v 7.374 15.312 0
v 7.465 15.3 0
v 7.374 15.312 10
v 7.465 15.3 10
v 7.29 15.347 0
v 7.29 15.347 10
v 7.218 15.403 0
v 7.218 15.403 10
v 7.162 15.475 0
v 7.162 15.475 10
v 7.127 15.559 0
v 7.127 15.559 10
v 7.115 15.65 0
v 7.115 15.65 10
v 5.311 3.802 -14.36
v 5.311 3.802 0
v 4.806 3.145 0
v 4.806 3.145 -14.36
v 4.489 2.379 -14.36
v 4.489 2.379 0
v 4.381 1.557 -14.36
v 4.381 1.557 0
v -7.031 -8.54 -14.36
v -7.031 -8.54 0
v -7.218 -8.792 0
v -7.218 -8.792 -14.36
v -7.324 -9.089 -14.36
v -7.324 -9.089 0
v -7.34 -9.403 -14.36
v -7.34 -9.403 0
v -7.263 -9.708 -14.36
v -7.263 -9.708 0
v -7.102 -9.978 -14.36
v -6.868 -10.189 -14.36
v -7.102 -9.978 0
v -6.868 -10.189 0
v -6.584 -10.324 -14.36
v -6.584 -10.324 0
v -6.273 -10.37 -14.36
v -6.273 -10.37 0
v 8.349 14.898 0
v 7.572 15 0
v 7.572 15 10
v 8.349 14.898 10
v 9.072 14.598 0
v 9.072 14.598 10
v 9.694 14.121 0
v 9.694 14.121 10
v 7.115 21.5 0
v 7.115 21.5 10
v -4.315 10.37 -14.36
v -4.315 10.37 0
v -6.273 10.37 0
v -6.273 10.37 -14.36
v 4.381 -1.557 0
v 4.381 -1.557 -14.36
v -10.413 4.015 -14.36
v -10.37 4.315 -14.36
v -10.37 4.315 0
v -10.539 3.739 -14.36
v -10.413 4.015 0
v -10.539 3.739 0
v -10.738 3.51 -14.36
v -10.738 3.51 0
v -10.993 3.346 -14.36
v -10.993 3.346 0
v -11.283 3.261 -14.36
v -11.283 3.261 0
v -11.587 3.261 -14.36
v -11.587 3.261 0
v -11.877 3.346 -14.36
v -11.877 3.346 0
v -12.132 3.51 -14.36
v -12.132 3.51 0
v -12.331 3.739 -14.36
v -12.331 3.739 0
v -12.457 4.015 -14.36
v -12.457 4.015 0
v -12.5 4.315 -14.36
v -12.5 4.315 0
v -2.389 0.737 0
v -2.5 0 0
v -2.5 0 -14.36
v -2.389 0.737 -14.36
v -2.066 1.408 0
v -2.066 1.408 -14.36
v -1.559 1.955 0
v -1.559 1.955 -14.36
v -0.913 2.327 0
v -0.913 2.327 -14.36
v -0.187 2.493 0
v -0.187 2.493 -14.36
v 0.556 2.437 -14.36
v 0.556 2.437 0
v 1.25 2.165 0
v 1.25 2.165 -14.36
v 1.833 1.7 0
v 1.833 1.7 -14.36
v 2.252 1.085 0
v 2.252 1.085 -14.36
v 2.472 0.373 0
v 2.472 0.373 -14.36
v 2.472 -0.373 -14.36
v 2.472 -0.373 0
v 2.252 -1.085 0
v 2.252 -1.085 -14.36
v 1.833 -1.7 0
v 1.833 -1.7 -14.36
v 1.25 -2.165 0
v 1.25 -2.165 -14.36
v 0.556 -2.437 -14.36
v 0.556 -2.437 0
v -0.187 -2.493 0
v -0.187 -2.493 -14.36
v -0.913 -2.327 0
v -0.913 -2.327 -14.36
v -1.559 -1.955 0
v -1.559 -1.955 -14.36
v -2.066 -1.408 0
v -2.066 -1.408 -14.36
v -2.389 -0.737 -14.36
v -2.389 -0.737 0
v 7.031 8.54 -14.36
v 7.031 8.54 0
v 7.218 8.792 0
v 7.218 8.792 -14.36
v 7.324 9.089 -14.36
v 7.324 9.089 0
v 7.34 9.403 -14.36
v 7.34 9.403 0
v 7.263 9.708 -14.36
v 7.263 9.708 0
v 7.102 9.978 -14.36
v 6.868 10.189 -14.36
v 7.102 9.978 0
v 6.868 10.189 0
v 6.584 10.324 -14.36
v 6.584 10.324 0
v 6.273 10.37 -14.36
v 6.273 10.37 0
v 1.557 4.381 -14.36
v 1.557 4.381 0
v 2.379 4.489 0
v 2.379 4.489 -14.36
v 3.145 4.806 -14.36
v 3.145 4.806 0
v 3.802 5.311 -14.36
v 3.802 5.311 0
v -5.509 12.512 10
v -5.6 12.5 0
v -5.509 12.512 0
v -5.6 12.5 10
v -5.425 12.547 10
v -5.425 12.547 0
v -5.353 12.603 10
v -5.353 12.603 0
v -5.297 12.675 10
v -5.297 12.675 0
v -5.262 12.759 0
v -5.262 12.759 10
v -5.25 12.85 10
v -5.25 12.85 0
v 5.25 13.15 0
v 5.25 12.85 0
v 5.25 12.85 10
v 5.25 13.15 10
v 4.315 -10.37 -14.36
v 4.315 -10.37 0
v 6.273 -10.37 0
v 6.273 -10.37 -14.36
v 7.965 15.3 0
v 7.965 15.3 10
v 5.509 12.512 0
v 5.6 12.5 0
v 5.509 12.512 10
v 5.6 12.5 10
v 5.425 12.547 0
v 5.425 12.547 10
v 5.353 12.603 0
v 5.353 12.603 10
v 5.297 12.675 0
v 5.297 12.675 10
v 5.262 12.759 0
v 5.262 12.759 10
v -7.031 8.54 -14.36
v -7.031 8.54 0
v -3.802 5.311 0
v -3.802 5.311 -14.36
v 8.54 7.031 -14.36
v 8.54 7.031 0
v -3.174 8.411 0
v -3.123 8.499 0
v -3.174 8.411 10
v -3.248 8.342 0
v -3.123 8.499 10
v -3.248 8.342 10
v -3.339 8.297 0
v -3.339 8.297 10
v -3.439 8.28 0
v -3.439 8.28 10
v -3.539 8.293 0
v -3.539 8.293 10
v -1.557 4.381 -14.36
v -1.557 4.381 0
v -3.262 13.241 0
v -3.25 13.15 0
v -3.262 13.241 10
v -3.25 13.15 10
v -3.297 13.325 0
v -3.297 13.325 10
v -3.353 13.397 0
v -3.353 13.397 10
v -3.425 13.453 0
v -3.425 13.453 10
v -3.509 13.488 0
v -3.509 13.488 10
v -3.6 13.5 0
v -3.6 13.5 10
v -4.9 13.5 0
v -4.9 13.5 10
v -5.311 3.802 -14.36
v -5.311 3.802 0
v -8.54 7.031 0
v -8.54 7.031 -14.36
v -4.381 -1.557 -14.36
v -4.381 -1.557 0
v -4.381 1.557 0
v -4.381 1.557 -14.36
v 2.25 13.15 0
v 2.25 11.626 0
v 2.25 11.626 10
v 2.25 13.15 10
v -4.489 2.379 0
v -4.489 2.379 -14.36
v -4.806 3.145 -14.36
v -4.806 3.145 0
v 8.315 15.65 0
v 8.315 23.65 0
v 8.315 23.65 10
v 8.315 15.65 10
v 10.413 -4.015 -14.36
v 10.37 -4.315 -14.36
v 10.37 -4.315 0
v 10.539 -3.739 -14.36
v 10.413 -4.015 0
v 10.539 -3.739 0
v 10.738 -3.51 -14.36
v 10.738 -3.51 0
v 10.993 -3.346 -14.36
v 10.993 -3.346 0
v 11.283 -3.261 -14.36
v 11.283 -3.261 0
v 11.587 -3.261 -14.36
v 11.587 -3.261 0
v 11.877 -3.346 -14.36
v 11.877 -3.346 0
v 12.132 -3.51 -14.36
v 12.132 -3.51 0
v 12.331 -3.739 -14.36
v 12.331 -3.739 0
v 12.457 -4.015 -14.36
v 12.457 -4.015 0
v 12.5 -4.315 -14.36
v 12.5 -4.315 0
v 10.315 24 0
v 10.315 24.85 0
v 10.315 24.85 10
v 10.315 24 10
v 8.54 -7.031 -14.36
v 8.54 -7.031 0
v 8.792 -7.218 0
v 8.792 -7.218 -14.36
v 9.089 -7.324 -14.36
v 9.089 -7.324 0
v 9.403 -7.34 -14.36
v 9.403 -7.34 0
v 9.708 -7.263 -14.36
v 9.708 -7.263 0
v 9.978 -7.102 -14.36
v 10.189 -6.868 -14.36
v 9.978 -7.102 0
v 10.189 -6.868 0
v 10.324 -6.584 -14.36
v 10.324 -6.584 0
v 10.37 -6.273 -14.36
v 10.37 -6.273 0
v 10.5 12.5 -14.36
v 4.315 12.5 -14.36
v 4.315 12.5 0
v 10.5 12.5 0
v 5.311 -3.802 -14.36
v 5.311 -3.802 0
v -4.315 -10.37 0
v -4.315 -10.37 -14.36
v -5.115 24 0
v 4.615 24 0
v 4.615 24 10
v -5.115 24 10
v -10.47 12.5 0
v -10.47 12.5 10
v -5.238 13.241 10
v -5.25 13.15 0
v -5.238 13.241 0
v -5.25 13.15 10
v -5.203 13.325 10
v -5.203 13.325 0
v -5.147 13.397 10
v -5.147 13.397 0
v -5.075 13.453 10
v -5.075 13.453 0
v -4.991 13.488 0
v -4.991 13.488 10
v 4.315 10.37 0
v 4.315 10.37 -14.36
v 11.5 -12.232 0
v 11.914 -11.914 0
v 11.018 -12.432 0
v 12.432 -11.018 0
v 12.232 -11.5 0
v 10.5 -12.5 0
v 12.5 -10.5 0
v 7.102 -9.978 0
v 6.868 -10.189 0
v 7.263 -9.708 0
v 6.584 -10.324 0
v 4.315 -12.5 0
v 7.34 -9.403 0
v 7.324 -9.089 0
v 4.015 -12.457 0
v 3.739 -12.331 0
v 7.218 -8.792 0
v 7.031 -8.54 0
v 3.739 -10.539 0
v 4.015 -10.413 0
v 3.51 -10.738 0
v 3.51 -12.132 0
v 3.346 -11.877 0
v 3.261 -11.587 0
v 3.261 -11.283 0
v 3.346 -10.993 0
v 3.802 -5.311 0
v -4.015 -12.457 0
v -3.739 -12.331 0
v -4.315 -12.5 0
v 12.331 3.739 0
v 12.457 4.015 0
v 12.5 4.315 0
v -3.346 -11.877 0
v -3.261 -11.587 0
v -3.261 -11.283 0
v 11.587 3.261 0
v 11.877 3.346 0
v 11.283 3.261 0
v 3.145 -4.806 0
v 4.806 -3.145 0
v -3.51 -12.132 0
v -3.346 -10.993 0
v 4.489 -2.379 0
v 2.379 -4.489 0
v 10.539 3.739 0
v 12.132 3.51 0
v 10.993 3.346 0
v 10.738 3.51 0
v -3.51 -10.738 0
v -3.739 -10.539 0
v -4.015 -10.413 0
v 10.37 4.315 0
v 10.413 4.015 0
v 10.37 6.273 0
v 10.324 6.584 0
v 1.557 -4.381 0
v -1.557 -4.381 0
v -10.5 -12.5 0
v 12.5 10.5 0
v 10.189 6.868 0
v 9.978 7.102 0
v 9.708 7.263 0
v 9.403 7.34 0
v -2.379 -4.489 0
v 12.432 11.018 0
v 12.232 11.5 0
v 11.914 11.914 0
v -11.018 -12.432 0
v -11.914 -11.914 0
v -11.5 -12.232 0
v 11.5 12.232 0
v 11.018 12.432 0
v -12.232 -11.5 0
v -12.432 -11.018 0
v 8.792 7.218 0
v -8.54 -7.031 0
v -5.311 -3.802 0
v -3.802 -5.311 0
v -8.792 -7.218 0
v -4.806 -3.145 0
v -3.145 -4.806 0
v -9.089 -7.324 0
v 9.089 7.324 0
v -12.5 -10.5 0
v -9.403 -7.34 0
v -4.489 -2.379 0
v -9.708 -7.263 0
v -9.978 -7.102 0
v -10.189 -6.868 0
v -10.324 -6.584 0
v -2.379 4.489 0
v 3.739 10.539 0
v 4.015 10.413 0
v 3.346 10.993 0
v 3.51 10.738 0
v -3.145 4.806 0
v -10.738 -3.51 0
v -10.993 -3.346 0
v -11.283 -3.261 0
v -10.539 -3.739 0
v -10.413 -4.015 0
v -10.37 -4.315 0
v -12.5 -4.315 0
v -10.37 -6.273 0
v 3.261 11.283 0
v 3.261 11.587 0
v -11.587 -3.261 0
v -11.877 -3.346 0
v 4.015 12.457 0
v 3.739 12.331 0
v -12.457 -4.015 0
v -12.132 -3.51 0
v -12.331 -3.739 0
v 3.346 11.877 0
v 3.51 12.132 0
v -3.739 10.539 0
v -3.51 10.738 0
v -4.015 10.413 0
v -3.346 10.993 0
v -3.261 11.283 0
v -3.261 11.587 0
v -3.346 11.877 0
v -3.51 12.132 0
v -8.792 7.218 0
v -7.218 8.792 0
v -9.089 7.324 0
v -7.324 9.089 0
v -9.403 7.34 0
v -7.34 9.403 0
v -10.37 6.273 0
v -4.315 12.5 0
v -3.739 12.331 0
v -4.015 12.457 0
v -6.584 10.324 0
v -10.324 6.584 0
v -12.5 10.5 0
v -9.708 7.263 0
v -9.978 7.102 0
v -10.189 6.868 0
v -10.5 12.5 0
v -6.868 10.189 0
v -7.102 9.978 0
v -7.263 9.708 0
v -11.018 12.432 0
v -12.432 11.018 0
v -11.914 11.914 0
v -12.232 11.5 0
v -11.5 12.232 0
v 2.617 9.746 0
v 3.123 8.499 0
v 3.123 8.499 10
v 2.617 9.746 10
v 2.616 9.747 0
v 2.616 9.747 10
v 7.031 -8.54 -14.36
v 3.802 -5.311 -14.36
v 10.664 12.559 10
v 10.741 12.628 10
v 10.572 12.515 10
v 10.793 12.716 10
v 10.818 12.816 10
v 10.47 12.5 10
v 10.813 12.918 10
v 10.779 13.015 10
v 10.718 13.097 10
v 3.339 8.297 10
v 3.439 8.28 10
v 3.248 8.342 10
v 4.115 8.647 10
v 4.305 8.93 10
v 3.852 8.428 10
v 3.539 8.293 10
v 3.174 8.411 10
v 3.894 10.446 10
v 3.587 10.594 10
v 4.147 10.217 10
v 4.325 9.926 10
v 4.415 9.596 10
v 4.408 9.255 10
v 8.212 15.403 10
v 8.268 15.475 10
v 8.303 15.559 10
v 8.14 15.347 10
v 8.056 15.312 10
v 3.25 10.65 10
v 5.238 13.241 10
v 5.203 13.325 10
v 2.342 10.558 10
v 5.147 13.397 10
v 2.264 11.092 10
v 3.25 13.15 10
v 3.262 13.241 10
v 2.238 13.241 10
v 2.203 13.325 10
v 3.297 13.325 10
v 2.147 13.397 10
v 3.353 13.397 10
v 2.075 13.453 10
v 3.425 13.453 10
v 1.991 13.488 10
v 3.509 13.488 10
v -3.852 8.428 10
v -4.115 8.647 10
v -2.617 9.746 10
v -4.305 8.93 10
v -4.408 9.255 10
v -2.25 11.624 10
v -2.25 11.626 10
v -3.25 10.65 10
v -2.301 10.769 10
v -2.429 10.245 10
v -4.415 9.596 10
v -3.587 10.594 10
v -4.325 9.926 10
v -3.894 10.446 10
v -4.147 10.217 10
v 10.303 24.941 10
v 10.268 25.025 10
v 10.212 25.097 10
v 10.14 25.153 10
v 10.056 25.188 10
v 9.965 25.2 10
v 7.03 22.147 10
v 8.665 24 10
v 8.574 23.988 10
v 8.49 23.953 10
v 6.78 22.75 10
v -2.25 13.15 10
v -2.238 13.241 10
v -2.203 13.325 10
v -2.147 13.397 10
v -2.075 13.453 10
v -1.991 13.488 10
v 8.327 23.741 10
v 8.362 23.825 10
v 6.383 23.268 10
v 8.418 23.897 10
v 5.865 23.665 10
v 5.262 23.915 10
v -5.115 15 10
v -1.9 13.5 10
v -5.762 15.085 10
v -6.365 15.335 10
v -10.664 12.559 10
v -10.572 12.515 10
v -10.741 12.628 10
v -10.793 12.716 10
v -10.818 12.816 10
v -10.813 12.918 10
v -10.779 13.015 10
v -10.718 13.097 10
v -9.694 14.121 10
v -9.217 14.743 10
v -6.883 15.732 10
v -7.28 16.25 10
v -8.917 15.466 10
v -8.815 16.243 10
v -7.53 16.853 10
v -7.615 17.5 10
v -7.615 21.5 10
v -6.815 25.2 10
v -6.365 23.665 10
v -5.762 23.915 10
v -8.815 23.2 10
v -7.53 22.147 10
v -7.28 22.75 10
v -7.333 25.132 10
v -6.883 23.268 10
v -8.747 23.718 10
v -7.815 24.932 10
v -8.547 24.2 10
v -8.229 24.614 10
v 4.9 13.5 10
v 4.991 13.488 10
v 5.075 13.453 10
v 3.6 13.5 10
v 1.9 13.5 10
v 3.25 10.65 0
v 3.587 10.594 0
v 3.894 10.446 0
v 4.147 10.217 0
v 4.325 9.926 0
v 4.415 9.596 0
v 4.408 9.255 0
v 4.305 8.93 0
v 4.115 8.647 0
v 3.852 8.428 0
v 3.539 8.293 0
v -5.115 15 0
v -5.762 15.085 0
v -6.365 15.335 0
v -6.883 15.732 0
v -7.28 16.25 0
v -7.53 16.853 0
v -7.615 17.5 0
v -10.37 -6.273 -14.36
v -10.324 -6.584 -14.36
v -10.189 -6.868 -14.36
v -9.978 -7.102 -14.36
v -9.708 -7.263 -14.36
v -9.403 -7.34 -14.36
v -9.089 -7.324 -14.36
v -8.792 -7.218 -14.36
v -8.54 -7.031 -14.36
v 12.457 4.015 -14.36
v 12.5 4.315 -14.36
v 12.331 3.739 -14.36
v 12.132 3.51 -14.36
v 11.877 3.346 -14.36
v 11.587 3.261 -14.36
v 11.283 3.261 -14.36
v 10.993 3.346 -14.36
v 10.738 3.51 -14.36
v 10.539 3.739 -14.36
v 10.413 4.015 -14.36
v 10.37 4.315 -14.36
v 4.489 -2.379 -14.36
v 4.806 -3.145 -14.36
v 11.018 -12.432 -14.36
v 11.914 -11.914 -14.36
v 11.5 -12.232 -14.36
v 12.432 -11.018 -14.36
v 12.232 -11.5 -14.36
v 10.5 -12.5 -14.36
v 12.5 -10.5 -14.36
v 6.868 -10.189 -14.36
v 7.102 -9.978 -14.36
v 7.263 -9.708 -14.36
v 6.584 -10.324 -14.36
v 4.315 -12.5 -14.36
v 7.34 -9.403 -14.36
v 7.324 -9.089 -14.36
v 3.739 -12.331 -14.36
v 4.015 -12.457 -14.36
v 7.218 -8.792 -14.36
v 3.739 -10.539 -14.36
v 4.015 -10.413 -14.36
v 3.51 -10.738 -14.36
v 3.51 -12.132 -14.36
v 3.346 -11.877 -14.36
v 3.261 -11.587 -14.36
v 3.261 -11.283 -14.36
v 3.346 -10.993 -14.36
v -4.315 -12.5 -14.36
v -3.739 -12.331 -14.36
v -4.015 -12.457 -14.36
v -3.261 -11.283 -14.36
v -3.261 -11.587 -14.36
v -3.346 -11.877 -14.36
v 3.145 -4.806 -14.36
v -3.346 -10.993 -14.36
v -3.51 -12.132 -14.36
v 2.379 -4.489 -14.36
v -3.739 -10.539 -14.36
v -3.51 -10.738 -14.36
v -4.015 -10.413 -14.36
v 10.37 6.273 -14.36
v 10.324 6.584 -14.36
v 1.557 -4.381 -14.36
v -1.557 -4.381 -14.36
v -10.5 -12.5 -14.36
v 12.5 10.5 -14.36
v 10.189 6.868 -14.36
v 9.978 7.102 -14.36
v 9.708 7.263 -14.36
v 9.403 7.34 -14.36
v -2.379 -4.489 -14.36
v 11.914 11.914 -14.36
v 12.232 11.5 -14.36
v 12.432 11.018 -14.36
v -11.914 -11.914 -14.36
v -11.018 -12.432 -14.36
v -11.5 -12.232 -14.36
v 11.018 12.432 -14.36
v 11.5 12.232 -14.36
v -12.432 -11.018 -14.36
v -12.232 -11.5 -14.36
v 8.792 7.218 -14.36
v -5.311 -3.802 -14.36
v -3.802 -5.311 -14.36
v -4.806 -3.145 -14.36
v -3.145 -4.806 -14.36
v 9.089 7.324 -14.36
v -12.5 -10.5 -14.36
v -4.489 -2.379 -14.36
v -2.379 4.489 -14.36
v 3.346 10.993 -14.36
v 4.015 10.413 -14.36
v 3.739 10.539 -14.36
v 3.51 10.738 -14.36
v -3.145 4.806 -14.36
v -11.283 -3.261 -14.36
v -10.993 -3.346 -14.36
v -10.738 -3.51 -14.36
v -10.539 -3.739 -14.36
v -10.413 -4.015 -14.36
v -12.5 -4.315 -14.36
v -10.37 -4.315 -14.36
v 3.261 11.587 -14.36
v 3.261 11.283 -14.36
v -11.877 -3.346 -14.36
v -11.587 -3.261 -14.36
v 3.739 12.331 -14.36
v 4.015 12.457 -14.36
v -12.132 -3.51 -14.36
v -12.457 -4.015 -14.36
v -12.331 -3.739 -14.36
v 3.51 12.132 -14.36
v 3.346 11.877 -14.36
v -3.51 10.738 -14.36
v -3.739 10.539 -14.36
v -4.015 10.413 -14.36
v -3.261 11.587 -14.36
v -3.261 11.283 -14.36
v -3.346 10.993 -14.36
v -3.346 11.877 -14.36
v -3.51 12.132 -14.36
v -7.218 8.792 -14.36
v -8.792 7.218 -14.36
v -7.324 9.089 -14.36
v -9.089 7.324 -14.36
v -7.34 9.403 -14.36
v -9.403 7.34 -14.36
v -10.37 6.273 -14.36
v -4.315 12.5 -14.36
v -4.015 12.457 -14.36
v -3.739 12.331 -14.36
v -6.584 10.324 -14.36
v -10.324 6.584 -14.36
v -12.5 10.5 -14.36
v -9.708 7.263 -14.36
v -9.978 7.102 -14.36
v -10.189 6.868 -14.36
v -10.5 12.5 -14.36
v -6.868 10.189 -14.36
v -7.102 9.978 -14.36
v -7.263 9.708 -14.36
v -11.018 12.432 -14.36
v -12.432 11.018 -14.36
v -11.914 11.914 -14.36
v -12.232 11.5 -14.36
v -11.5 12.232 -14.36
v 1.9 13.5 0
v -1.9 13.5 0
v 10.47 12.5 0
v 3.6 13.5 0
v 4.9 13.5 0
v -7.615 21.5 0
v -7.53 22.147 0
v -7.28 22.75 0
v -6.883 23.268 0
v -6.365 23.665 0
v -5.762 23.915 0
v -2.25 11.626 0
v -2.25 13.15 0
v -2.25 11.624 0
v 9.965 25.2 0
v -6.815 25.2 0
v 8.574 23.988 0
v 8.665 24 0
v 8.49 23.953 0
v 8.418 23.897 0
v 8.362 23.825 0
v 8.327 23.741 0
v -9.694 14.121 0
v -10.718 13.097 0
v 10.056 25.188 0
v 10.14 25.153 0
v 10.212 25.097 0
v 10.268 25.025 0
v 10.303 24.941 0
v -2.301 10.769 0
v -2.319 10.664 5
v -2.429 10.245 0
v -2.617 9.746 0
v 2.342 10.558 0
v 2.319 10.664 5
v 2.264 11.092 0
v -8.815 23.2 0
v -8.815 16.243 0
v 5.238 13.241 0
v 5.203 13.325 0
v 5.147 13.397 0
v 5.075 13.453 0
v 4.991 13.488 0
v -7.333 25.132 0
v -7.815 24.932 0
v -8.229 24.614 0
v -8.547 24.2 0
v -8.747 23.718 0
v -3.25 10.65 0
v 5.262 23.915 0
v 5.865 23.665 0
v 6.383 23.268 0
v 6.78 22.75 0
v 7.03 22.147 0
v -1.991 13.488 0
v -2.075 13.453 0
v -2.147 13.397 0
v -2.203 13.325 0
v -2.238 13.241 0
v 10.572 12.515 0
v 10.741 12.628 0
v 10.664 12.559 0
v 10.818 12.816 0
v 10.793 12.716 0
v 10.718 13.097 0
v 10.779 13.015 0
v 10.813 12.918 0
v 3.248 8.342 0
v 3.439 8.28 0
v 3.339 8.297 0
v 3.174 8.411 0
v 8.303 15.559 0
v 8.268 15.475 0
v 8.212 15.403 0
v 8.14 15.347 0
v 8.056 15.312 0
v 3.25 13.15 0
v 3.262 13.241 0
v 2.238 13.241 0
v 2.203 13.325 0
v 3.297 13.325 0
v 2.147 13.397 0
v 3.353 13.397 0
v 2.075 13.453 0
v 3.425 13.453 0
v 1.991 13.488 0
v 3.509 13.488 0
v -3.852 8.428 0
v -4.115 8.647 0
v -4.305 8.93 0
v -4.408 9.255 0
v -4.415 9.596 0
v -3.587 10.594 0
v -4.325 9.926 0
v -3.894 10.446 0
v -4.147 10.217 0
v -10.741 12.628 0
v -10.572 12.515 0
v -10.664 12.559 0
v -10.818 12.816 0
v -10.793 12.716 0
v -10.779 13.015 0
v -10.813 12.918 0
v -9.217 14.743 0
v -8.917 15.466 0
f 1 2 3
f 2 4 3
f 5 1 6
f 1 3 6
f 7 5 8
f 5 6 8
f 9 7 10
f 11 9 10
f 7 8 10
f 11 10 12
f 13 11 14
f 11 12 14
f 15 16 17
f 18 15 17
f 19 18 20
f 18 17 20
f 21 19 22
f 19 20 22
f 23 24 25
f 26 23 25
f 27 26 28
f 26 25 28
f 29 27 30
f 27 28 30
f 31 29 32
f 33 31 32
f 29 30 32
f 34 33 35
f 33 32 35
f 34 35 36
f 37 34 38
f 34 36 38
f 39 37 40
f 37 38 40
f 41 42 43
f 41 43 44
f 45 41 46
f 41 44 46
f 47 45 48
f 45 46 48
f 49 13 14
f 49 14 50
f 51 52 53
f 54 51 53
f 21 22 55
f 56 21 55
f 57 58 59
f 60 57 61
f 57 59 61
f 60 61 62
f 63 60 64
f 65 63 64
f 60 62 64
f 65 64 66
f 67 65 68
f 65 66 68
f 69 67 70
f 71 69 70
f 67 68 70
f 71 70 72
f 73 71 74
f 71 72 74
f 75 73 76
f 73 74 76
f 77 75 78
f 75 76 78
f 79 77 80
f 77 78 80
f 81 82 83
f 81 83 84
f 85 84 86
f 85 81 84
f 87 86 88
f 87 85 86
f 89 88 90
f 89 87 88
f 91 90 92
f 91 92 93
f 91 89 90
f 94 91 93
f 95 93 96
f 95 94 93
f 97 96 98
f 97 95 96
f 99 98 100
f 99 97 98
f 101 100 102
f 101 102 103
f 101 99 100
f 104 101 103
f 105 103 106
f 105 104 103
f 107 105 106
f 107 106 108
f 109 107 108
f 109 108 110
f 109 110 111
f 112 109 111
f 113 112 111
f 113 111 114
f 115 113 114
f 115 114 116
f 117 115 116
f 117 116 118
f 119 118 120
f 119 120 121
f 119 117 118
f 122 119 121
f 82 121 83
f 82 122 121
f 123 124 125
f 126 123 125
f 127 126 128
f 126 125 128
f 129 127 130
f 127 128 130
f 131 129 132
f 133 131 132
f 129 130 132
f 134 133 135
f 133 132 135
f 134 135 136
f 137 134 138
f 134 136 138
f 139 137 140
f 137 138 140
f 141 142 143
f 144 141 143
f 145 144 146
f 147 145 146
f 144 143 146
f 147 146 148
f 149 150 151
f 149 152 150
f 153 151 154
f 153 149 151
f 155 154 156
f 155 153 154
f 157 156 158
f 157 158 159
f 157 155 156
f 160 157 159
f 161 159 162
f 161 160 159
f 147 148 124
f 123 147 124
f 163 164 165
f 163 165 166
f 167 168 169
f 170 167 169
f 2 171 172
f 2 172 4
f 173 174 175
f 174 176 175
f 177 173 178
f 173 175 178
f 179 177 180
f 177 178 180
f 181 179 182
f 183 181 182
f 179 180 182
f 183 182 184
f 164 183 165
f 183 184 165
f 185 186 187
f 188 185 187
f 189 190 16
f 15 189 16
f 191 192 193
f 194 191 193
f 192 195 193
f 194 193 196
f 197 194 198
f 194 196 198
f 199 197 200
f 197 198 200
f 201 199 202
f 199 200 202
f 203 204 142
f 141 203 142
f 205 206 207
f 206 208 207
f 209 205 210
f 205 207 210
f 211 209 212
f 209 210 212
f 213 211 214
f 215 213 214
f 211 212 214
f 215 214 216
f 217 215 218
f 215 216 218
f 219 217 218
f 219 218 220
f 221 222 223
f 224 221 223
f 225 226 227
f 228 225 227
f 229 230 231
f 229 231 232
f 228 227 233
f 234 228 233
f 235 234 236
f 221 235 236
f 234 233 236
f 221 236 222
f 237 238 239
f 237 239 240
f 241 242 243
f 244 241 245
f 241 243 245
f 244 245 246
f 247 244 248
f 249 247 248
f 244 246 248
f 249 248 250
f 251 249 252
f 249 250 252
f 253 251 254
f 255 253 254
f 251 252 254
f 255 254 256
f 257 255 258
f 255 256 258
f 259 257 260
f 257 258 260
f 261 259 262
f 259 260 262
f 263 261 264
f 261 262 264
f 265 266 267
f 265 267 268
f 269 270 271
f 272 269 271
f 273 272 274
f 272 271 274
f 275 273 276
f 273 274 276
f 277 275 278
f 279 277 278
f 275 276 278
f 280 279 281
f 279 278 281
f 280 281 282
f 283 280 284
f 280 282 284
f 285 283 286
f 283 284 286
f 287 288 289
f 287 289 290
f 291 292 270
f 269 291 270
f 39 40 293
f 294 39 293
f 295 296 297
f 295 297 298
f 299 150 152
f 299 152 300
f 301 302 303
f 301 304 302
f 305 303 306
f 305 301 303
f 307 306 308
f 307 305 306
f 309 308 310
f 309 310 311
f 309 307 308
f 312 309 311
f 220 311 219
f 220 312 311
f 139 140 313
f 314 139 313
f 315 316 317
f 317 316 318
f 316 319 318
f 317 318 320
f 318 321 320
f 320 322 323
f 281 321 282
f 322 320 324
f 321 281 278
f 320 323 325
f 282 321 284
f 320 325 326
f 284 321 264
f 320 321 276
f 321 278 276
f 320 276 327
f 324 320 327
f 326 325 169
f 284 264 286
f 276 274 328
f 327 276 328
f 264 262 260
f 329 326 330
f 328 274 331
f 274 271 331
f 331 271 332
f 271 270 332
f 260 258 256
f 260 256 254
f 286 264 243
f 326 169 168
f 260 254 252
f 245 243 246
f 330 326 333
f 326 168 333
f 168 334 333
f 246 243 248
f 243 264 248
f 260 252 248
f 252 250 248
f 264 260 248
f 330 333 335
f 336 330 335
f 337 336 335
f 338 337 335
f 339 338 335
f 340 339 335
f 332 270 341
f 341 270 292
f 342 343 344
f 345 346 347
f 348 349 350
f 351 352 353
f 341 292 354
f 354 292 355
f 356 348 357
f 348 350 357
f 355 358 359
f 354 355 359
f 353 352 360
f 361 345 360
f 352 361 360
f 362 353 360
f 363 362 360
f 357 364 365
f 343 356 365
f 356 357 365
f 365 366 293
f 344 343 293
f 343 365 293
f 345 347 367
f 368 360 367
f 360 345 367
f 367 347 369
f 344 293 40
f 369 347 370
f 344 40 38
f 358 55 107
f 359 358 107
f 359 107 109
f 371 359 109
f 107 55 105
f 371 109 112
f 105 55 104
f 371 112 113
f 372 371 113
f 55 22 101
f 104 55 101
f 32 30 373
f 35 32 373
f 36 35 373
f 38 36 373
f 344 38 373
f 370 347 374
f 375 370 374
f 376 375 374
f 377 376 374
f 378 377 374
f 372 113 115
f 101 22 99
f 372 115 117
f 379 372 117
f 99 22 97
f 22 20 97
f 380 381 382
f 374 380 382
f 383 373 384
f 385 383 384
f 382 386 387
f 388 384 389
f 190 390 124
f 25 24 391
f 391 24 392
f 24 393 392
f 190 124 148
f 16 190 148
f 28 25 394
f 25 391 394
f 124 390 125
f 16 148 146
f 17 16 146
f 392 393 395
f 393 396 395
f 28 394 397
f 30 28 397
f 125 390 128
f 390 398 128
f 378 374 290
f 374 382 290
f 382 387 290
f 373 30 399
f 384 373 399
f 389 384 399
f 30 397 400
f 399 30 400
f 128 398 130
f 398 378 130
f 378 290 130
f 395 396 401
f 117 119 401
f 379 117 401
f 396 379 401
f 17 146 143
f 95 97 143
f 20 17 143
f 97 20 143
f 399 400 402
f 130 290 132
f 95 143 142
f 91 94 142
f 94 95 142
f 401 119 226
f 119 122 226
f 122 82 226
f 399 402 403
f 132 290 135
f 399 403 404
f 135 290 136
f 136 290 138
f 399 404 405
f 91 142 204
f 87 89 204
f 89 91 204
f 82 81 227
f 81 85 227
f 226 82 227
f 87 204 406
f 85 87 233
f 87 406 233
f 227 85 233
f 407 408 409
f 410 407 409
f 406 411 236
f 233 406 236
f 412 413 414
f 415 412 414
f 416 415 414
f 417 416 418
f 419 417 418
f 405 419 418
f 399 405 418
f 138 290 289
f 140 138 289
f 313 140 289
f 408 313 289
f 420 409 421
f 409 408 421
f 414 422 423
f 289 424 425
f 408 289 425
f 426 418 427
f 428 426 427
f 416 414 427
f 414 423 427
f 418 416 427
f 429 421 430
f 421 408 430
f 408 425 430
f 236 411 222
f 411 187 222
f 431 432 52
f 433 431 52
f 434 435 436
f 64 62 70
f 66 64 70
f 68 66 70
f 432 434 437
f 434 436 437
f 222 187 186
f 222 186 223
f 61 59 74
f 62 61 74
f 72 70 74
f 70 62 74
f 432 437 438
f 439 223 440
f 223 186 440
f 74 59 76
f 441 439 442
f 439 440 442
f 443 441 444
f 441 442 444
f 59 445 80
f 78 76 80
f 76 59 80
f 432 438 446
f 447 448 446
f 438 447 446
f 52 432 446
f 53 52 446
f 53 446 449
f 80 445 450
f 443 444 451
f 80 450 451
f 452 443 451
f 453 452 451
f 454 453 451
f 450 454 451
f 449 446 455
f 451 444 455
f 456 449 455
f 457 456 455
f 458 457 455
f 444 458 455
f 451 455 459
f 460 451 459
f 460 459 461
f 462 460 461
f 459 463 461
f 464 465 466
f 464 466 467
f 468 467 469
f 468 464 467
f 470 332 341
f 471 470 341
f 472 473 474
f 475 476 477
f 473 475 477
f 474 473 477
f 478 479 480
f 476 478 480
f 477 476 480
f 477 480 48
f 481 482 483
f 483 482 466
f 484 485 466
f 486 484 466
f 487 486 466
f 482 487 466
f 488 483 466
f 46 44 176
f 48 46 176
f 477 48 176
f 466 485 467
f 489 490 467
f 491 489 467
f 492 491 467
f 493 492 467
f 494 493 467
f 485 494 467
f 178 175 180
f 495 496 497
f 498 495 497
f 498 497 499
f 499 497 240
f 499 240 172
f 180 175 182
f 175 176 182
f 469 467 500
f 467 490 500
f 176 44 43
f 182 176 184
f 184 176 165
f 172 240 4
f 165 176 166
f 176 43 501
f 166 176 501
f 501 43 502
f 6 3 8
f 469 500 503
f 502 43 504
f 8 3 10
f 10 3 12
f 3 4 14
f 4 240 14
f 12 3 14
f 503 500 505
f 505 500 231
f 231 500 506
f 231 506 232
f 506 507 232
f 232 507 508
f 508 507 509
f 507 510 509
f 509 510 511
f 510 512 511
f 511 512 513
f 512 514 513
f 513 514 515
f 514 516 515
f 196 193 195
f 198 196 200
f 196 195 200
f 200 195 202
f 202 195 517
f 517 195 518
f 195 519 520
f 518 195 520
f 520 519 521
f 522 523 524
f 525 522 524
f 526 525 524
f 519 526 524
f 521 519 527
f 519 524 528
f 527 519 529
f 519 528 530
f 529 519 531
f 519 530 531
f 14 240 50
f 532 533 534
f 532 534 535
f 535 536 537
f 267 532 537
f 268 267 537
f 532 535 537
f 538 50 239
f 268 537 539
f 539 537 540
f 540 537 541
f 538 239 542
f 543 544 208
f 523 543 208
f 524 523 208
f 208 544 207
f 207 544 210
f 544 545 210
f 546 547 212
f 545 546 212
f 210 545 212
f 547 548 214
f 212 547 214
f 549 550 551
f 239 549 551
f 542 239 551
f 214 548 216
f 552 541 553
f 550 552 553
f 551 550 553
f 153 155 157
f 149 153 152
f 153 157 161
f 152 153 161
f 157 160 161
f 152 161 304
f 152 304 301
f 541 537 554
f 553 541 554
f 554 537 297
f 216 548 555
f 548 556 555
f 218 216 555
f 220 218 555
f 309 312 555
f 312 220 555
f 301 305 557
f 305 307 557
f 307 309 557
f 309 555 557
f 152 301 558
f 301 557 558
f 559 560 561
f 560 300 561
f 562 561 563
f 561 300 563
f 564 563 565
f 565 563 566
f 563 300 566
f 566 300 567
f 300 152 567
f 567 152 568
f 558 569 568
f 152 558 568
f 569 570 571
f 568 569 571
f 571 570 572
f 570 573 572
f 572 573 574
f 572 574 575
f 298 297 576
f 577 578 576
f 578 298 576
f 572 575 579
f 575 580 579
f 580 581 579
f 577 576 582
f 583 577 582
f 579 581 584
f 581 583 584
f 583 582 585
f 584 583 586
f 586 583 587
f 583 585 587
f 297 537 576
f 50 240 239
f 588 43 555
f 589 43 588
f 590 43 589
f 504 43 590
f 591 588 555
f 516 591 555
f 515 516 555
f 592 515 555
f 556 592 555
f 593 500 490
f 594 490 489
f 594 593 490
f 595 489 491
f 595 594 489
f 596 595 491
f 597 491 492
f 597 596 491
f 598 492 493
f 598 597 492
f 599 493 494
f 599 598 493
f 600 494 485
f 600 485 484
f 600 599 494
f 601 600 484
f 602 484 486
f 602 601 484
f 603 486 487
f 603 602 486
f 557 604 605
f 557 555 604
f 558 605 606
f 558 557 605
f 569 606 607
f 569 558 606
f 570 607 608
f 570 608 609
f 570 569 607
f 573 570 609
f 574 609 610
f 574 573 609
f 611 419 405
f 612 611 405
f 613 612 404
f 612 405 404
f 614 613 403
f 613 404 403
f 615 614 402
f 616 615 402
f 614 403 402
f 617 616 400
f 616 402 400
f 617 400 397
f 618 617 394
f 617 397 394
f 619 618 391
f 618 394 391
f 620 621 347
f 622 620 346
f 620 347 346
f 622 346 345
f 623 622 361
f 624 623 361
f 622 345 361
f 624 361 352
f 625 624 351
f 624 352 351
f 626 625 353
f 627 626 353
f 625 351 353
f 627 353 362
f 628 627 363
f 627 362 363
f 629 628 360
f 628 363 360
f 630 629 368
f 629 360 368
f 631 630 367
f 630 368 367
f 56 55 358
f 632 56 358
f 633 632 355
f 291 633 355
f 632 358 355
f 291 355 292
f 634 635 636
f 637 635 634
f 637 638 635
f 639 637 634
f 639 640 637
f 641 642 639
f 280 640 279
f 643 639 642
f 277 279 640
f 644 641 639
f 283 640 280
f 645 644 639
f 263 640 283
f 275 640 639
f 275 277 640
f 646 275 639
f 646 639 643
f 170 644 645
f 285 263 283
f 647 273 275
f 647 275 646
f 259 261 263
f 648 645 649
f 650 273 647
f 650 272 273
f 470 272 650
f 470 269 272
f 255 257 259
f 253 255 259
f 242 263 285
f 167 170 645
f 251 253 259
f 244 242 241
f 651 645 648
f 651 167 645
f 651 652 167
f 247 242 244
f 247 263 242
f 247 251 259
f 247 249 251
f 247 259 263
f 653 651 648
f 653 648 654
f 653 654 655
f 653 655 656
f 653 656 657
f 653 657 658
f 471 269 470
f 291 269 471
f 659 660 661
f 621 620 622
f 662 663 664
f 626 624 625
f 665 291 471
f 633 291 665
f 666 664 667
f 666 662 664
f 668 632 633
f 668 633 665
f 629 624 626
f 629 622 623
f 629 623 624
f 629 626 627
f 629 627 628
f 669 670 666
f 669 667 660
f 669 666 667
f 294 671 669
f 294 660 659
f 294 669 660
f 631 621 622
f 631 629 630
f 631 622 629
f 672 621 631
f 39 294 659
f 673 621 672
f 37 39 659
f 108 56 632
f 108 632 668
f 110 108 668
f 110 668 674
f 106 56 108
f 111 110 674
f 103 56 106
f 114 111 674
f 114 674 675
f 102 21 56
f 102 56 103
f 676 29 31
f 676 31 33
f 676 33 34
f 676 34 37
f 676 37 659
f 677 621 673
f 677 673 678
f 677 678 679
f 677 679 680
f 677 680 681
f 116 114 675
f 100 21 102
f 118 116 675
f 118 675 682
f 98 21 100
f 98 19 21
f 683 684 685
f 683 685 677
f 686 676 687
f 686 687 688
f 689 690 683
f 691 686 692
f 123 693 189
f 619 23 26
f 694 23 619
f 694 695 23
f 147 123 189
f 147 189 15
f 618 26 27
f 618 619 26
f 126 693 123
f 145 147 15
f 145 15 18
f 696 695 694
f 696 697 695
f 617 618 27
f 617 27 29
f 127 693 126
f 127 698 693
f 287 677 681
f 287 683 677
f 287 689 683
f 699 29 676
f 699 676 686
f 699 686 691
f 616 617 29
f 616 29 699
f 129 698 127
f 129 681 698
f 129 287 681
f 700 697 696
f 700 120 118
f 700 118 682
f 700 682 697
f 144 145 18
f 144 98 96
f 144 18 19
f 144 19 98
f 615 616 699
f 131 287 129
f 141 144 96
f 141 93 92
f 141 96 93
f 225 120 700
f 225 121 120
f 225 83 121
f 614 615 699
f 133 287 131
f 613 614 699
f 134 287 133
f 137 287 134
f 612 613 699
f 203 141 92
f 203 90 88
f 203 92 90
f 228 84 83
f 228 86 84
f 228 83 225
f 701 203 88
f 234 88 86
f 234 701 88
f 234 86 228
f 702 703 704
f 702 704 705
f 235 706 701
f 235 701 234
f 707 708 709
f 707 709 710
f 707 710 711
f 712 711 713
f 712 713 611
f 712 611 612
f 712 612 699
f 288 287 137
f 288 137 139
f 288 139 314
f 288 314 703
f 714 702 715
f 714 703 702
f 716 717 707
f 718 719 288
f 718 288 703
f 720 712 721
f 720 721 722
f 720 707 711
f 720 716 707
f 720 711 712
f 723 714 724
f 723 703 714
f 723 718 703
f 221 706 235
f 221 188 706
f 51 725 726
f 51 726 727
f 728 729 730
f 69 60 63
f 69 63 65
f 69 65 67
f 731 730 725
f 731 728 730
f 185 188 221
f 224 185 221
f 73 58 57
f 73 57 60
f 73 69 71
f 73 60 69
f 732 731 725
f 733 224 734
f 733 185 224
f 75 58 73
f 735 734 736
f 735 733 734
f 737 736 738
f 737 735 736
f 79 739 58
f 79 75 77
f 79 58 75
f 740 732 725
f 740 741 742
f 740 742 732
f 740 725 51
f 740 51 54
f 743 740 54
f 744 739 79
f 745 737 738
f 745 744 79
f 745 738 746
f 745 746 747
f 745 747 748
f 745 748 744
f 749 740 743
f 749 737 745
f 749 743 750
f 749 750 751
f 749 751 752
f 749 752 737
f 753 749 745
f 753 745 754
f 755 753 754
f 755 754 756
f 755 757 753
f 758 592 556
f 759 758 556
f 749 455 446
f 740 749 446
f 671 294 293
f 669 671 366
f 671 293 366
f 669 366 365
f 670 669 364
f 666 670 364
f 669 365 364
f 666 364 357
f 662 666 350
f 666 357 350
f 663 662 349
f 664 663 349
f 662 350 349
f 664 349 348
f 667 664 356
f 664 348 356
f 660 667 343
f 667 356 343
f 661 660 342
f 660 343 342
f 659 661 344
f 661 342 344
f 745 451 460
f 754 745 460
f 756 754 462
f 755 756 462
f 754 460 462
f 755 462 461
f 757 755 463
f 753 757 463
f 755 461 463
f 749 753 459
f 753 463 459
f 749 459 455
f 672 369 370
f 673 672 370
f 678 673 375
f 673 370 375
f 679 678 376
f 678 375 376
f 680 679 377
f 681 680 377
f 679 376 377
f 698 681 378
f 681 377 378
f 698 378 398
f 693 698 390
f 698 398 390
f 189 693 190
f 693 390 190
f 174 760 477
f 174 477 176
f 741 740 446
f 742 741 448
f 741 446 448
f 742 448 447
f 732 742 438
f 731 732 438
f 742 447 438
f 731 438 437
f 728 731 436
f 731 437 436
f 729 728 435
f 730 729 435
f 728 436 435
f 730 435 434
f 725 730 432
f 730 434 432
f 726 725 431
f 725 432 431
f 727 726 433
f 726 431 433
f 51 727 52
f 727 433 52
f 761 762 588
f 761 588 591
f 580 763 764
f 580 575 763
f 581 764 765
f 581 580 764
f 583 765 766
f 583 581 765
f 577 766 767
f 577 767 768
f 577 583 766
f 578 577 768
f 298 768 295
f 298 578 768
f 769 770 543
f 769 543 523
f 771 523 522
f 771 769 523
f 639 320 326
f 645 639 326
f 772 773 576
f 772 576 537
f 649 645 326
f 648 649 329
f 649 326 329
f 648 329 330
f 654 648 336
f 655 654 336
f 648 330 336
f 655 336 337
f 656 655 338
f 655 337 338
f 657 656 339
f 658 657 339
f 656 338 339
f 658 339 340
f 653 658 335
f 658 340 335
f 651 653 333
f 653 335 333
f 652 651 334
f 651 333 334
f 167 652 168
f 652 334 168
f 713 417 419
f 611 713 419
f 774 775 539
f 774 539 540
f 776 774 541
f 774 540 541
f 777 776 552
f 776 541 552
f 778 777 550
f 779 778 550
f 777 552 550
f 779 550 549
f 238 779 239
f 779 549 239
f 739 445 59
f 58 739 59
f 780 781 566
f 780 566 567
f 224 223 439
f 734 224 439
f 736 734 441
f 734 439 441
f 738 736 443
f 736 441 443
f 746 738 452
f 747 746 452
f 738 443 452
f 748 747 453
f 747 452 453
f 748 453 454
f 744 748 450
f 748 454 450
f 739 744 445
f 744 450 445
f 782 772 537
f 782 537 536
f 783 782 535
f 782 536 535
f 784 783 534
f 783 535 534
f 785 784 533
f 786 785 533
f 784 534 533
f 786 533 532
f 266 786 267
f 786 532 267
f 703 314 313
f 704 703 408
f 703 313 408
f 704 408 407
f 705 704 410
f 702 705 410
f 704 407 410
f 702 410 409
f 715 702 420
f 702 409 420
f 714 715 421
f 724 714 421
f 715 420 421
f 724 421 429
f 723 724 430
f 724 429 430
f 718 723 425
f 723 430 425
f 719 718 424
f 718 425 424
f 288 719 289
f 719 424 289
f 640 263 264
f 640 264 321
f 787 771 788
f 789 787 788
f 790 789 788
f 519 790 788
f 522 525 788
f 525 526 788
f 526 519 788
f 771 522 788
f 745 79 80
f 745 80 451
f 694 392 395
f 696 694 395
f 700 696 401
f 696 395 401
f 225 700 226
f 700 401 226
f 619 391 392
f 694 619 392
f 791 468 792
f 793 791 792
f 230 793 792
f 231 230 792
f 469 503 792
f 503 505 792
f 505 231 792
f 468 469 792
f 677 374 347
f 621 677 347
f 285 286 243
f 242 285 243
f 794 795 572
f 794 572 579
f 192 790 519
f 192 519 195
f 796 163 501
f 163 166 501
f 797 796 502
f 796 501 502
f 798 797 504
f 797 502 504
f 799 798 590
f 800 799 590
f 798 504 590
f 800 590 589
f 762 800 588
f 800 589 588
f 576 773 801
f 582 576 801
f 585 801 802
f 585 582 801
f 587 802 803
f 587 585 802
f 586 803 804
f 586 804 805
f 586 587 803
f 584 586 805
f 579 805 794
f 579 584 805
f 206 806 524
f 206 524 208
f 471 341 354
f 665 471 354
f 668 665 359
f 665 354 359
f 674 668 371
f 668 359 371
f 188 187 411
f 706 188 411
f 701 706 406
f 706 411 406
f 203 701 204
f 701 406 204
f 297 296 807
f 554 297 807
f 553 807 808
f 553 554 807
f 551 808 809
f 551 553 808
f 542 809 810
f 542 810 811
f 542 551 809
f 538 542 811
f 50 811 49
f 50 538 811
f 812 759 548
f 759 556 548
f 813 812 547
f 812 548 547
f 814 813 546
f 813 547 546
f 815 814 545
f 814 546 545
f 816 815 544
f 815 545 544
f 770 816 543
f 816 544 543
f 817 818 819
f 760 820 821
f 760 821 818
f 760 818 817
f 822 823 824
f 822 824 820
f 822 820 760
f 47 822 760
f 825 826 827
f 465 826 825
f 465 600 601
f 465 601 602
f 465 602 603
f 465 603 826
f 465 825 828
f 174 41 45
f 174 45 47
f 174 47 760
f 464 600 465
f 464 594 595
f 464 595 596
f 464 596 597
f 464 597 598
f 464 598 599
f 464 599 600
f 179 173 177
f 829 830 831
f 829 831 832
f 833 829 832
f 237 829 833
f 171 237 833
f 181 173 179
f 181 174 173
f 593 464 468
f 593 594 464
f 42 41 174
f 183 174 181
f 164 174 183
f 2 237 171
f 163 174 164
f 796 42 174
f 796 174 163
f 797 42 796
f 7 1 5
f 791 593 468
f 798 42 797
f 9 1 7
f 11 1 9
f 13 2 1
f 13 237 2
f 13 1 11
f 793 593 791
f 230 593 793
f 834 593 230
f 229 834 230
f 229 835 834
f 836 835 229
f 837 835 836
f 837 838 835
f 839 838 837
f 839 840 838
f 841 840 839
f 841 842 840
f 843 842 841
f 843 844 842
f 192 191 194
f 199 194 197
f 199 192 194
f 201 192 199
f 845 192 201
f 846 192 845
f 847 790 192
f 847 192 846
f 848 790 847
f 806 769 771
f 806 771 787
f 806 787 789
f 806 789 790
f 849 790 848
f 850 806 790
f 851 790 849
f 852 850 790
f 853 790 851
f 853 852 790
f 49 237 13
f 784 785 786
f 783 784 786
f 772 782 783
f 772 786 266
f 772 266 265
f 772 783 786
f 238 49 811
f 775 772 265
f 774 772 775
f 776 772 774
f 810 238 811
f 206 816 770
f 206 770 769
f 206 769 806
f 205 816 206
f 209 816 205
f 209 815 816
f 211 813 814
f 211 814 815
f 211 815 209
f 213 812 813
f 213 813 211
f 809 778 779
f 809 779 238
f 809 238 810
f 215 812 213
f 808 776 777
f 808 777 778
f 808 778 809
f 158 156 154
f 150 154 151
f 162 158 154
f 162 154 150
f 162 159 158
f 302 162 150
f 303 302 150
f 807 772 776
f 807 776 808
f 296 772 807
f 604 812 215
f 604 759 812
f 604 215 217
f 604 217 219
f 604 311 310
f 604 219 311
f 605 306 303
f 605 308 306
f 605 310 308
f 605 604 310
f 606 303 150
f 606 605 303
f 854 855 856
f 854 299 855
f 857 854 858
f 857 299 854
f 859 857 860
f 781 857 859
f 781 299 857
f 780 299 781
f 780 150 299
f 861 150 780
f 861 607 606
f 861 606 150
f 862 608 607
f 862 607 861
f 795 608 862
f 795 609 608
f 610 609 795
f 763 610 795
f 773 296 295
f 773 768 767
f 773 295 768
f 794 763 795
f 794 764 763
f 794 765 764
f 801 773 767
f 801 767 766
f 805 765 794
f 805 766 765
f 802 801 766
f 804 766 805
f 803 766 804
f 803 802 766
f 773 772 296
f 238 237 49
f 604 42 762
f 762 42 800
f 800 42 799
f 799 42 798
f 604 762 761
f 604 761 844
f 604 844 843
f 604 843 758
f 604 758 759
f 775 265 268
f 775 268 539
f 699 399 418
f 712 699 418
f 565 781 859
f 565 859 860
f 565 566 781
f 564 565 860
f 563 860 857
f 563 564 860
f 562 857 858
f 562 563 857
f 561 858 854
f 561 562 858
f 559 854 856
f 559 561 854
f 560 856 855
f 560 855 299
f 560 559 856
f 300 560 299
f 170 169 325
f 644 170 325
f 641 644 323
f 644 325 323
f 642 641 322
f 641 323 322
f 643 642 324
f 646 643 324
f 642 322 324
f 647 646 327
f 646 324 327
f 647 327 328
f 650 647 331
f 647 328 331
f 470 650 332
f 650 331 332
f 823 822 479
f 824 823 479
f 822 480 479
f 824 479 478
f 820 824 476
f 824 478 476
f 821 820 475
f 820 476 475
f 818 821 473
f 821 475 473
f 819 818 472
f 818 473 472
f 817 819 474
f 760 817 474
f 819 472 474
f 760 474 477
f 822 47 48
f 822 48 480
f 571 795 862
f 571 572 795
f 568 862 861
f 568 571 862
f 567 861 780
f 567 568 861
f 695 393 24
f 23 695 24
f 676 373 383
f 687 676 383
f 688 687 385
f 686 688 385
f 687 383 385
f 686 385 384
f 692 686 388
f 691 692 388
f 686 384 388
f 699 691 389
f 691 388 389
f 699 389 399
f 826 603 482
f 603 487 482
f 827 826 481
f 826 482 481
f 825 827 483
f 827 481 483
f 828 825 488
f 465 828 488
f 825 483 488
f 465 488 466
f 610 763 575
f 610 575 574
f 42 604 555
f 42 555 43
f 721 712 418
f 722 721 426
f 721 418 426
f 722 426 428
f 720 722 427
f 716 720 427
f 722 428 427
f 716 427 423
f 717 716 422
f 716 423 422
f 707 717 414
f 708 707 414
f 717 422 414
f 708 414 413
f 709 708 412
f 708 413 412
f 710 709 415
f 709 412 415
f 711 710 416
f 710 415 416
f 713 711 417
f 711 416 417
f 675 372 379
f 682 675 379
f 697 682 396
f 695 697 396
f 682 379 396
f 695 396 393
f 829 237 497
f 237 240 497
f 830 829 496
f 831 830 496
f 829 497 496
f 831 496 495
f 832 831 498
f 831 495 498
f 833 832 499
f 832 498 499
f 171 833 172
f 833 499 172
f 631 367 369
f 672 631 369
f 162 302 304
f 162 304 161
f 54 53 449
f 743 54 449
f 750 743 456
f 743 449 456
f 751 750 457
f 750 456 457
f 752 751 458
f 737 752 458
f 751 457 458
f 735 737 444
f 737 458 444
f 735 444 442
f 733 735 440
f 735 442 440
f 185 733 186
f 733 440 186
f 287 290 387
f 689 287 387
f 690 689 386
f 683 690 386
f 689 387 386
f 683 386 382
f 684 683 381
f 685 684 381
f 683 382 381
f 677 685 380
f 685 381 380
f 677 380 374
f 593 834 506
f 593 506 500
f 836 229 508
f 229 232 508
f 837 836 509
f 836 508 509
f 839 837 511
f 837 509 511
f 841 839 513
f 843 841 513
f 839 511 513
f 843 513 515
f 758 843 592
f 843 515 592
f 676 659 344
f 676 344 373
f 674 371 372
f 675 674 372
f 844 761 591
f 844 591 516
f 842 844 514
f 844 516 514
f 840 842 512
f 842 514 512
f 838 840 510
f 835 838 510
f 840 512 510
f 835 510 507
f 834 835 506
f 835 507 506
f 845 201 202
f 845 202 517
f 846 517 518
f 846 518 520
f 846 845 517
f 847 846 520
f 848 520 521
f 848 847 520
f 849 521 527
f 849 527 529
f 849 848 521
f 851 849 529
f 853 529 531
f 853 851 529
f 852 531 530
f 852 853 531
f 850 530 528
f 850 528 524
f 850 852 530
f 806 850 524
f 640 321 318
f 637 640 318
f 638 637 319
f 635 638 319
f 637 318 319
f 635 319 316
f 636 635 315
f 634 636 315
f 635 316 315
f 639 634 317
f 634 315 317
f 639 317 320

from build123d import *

# Parameters (mm, degrees)
SKETCH11_R                             = 2.5
F_25_SERIES_EXTRUSIONS_25_2525_1_DEPTH = 14.359821885
BOSS_EXTRUDE1_DEPTH                    = 10
BOSS_EXTRUDE3_DEPTH                    = 10
FILLET_R0_35_R                         = 0.35
FILLET2_R                              = 2.5
FILLET_R3_0_R                          = 3
FILLET4_R                              = 2


with BuildPart() as part:
    # Sketch11 → 25 series extrusions 25-2525(1) (new body)
    with BuildSketch(Plane(origin=(0, 0, 0), x_dir=(-1, 0, 0), z_dir=(0, 0, -1))):
        with BuildLine():
            Line((12.5, -10.5), (12.5, -4.315))
            ThreePointArc((12.5, -4.315), (11.435, -3.25), (10.37, -4.315))
            Line((10.37, -4.315), (10.37, -6.272801987))
            ThreePointArc((10.37, -6.272801987), (9.708114403, -7.263383786), (8.539643501, -7.030960473))
            Line((8.539643501, -7.030960473), (5.311043881, -3.802360852))
            ThreePointArc((5.311043881, -3.802360852), (4.622790395, -2.77231672), (4.381107911, -1.557296822))
            Line((4.381107911, -1.557296822), (4.381107911, 1.557296822))
            ThreePointArc((4.381107911, 1.557296822), (4.622790395, 2.77231672), (5.311043881, 3.802360852))
            Line((5.311043881, 3.802360852), (8.539643501, 7.030960473))
            ThreePointArc((8.539643501, 7.030960473), (9.708114403, 7.263383786), (10.37, 6.272801987))
            Line((10.37, 6.272801987), (10.37, 4.315))
            ThreePointArc((10.37, 4.315), (11.435, 3.25), (12.5, 4.315))
            Line((12.5, 4.315), (12.5, 10.5))
            ThreePointArc((12.5, 10.5), (11.914213562, 11.914213562), (10.5, 12.5))
            Line((10.5, 12.5), (4.315, 12.5))
            ThreePointArc((4.315, 12.5), (3.25, 11.435), (4.315, 10.37))
            Line((4.315, 10.37), (6.272801987, 10.37))
            ThreePointArc((6.272801987, 10.37), (7.263383786, 9.708114403), (7.030960473, 8.539643501))
            Line((7.030960473, 8.539643501), (3.802360852, 5.311043881))
            ThreePointArc((3.802360852, 5.311043881), (2.77231672, 4.622790395), (1.557296822, 4.381107911))
            Line((1.557296822, 4.381107911), (-1.557296822, 4.381107911))
            ThreePointArc((-1.557296822, 4.381107911), (-2.77231672, 4.622790395), (-3.802360852, 5.311043881))
            Line((-3.802360852, 5.311043881), (-7.030960473, 8.539643501))
            ThreePointArc((-7.030960473, 8.539643501), (-7.263383786, 9.708114403), (-6.272801987, 10.37))
            Line((-6.272801987, 10.37), (-4.315, 10.37))
            ThreePointArc((-4.315, 10.37), (-3.25, 11.435), (-4.315, 12.5))
            Line((-4.315, 12.5), (-10.5, 12.5))
            ThreePointArc((-10.5, 12.5), (-11.914213562, 11.914213562), (-12.5, 10.5))
            Line((-12.5, 10.5), (-12.5, 4.315))
            ThreePointArc((-12.5, 4.315), (-11.435, 3.25), (-10.37, 4.315))
            Line((-10.37, 4.315), (-10.37, 6.272801987))
            ThreePointArc((-10.37, 6.272801987), (-9.708114403, 7.263383786), (-8.539643501, 7.030960473))
            Line((-8.539643501, 7.030960473), (-5.311043881, 3.802360852))
            ThreePointArc((-5.311043881, 3.802360852), (-4.622790395, 2.77231672), (-4.381107911, 1.557296822))
            Line((-4.381107911, 1.557296822), (-4.381107911, -1.557296822))
            ThreePointArc((-4.381107911, -1.557296822), (-4.622790395, -2.77231672), (-5.311043881, -3.802360852))
            Line((-5.311043881, -3.802360852), (-8.539643501, -7.030960473))
            ThreePointArc((-8.539643501, -7.030960473), (-9.708114403, -7.263383786), (-10.37, -6.272801987))
            Line((-10.37, -6.272801987), (-10.37, -4.315))
            ThreePointArc((-10.37, -4.315), (-11.435, -3.25), (-12.5, -4.315))
            Line((-12.5, -4.315), (-12.5, -10.5))
            ThreePointArc((-12.5, -10.5), (-11.914213562, -11.914213562), (-10.5, -12.5))
            Line((-10.5, -12.5), (-4.315, -12.5))
            ThreePointArc((-4.315, -12.5), (-3.25, -11.435), (-4.315, -10.37))
            Line((-4.315, -10.37), (-6.272801987, -10.37))
            ThreePointArc((-6.272801987, -10.37), (-7.263383786, -9.708114403), (-7.030960473, -8.539643501))
            Line((-7.030960473, -8.539643501), (-3.802360852, -5.311043881))
            ThreePointArc((-3.802360852, -5.311043881), (-2.77231672, -4.622790395), (-1.557296822, -4.381107911))
            Line((-1.557296822, -4.381107911), (1.557296822, -4.381107911))
            ThreePointArc((1.557296822, -4.381107911), (2.77231672, -4.622790395), (3.802360852, -5.311043881))
            Line((3.802360852, -5.311043881), (7.030960473, -8.539643501))
            ThreePointArc((7.030960473, -8.539643501), (7.263383786, -9.708114403), (6.272801987, -10.37))
            Line((6.272801987, -10.37), (4.315, -10.37))
            ThreePointArc((4.315, -10.37), (3.25, -11.435), (4.315, -12.5))
            Line((4.315, -12.5), (10.5, -12.5))
            ThreePointArc((10.5, -12.5), (11.914213562, -11.914213562), (12.5, -10.5))
        make_face()
        Circle(SKETCH11_R, mode=Mode.SUBTRACT)
    extrude(amount=F_25_SERIES_EXTRUSIONS_25_2525_1_DEPTH)


with BuildPart() as body_2:
    # Sketch14 → Boss-Extrude1 (new body)
    with BuildSketch(Plane.XY):
        with BuildLine():
            Line((-11.315, 12.5), (-8.815, 15))
            Line((-8.815, 15), (8.815, 15))
            Line((8.815, 15), (11.315, 12.5))
            Line((11.315, 12.5), (5.25, 12.5))
            Line((5.25, 12.5), (5.25, 13.5))
            Line((5.25, 13.5), (3.25, 13.5))
            Line((3.25, 13.5), (3.25, 10.65))
            ThreePointArc((3.25, 10.65), (4.423527877, 9.437089868), (3.223600485, 8.250290424))
            Line((3.223600485, 8.250290424), (2.25, 10.65))
            Line((2.25, 10.65), (2.25, 13.5))
            Line((2.25, 13.5), (-2.25, 13.5))
            Line((-2.25, 13.5), (-2.25, 10.65))
            Line((-2.25, 10.65), (-3.223600485, 8.250290424))
            ThreePointArc((-3.223600485, 8.250290424), (-4.423527877, 9.437089868), (-3.25, 10.65))
            Line((-3.25, 10.65), (-3.25, 13.5))
            Line((-3.25, 13.5), (-5.25, 13.5))
            Line((-5.25, 13.5), (-5.25, 12.5))
            Line((-5.25, 12.5), (-11.315, 12.5))
        make_face()
    extrude(amount=BOSS_EXTRUDE1_DEPTH)

    # Sketch15 → Boss-Extrude3 (add)
    with BuildSketch(Plane.XY):
        Polygon((-8.815, 15), (-8.815, 25.2), (10.315, 25.2), (10.315, 24), (8.315, 24), (8.315, 15.3), (7.115, 15.3), (7.115, 24), (-7.615, 24), (-7.615, 15), align=None)
    extrude(amount=BOSS_EXTRUDE3_DEPTH)

    # r0.35
    fillet_r0_35_edges = [body_2.edges().sort_by_distance(p)[0] for p in [
        (-11.315, 12.5, 5),
        (11.315, 12.5, 5),
        (5.25, 12.5, 5),
        (5.25, 13.5, 5),
        (3.25, 13.5, 5),
        (3.223600485, 8.250290424, 5),
        (2.25, 13.5, 5),
        (-2.25, 13.5, 5),
        (-3.223600485, 8.250290424, 5),
        (-3.25, 13.5, 5),
        (-5.25, 13.5, 5),
        (-5.25, 12.5, 5),
        (7.115, 15.3, 5),
        (8.315, 15.3, 5),
        (8.315, 24, 5),
        (10.315, 25.2, 5),
    ]]
    fillet(fillet_r0_35_edges, radius=FILLET_R0_35_R)

    # r5.0
    # a fillet whose section is not a circle: 5 mm, written as the material it takes off along each edge
    with BuildSketch(Plane(origin=(2.25, 10.65, -2.439171554), x_dir=(0, 1, 0), z_dir=(0, 0, 1)), Plane(origin=(-2.25, 10.65, -2.439171554), x_dir=(-0.3759522508024761, -0.9266390371210097, 0), z_dir=(0, 0, 1))) as fillet_r5_0_piece_1:
        with BuildLine():
            add(Edge.make_bspline([(0.975668622, 0), (0.793756187, 0), (0.611843752, 0), (0.20704727, -0.015883221), (-0.18588675, -0.0925579), (-0.566958306, -0.230024036), (-0.735525469, -0.298414425), (-0.904092632, -0.366804814)], knots=[0, 0, 0, 0, 0, 0, 0.5, 0.5, 1, 1, 1, 1, 1, 1], degree=5))
            Line((-0.904092632, -0.366804814), (0, 0))
            Line((0, 0), (0.975668622, 0))
        make_face()
    extrude(amount=14.878343109, mode=Mode.SUBTRACT)

    # Fillet2
    fillet2_edges = [body_2.edges().sort_by_distance(p)[0] for p in [
        (-7.615, 15, 5),
        (-7.615, 24, 5),
        (7.115, 24, 5),
    ]]
    fillet(fillet2_edges, radius=FILLET2_R)

    # r3.0
    fillet_r3_0_edges = [body_2.edges().sort_by_distance(p)[0] for p in [
        (-8.815, 15, 5),
        (8.815, 15, 5),
    ]]
    fillet(fillet_r3_0_edges, radius=FILLET_R3_0_R)

    # Fillet4
    fillet4_edges = [body_2.edges().sort_by_distance(p)[0] for p in [
        (-8.815, 25.2, 5),
    ]]
    fillet(fillet4_edges, radius=FILLET4_R)


solid = Compound([part.part, body_2.part])
